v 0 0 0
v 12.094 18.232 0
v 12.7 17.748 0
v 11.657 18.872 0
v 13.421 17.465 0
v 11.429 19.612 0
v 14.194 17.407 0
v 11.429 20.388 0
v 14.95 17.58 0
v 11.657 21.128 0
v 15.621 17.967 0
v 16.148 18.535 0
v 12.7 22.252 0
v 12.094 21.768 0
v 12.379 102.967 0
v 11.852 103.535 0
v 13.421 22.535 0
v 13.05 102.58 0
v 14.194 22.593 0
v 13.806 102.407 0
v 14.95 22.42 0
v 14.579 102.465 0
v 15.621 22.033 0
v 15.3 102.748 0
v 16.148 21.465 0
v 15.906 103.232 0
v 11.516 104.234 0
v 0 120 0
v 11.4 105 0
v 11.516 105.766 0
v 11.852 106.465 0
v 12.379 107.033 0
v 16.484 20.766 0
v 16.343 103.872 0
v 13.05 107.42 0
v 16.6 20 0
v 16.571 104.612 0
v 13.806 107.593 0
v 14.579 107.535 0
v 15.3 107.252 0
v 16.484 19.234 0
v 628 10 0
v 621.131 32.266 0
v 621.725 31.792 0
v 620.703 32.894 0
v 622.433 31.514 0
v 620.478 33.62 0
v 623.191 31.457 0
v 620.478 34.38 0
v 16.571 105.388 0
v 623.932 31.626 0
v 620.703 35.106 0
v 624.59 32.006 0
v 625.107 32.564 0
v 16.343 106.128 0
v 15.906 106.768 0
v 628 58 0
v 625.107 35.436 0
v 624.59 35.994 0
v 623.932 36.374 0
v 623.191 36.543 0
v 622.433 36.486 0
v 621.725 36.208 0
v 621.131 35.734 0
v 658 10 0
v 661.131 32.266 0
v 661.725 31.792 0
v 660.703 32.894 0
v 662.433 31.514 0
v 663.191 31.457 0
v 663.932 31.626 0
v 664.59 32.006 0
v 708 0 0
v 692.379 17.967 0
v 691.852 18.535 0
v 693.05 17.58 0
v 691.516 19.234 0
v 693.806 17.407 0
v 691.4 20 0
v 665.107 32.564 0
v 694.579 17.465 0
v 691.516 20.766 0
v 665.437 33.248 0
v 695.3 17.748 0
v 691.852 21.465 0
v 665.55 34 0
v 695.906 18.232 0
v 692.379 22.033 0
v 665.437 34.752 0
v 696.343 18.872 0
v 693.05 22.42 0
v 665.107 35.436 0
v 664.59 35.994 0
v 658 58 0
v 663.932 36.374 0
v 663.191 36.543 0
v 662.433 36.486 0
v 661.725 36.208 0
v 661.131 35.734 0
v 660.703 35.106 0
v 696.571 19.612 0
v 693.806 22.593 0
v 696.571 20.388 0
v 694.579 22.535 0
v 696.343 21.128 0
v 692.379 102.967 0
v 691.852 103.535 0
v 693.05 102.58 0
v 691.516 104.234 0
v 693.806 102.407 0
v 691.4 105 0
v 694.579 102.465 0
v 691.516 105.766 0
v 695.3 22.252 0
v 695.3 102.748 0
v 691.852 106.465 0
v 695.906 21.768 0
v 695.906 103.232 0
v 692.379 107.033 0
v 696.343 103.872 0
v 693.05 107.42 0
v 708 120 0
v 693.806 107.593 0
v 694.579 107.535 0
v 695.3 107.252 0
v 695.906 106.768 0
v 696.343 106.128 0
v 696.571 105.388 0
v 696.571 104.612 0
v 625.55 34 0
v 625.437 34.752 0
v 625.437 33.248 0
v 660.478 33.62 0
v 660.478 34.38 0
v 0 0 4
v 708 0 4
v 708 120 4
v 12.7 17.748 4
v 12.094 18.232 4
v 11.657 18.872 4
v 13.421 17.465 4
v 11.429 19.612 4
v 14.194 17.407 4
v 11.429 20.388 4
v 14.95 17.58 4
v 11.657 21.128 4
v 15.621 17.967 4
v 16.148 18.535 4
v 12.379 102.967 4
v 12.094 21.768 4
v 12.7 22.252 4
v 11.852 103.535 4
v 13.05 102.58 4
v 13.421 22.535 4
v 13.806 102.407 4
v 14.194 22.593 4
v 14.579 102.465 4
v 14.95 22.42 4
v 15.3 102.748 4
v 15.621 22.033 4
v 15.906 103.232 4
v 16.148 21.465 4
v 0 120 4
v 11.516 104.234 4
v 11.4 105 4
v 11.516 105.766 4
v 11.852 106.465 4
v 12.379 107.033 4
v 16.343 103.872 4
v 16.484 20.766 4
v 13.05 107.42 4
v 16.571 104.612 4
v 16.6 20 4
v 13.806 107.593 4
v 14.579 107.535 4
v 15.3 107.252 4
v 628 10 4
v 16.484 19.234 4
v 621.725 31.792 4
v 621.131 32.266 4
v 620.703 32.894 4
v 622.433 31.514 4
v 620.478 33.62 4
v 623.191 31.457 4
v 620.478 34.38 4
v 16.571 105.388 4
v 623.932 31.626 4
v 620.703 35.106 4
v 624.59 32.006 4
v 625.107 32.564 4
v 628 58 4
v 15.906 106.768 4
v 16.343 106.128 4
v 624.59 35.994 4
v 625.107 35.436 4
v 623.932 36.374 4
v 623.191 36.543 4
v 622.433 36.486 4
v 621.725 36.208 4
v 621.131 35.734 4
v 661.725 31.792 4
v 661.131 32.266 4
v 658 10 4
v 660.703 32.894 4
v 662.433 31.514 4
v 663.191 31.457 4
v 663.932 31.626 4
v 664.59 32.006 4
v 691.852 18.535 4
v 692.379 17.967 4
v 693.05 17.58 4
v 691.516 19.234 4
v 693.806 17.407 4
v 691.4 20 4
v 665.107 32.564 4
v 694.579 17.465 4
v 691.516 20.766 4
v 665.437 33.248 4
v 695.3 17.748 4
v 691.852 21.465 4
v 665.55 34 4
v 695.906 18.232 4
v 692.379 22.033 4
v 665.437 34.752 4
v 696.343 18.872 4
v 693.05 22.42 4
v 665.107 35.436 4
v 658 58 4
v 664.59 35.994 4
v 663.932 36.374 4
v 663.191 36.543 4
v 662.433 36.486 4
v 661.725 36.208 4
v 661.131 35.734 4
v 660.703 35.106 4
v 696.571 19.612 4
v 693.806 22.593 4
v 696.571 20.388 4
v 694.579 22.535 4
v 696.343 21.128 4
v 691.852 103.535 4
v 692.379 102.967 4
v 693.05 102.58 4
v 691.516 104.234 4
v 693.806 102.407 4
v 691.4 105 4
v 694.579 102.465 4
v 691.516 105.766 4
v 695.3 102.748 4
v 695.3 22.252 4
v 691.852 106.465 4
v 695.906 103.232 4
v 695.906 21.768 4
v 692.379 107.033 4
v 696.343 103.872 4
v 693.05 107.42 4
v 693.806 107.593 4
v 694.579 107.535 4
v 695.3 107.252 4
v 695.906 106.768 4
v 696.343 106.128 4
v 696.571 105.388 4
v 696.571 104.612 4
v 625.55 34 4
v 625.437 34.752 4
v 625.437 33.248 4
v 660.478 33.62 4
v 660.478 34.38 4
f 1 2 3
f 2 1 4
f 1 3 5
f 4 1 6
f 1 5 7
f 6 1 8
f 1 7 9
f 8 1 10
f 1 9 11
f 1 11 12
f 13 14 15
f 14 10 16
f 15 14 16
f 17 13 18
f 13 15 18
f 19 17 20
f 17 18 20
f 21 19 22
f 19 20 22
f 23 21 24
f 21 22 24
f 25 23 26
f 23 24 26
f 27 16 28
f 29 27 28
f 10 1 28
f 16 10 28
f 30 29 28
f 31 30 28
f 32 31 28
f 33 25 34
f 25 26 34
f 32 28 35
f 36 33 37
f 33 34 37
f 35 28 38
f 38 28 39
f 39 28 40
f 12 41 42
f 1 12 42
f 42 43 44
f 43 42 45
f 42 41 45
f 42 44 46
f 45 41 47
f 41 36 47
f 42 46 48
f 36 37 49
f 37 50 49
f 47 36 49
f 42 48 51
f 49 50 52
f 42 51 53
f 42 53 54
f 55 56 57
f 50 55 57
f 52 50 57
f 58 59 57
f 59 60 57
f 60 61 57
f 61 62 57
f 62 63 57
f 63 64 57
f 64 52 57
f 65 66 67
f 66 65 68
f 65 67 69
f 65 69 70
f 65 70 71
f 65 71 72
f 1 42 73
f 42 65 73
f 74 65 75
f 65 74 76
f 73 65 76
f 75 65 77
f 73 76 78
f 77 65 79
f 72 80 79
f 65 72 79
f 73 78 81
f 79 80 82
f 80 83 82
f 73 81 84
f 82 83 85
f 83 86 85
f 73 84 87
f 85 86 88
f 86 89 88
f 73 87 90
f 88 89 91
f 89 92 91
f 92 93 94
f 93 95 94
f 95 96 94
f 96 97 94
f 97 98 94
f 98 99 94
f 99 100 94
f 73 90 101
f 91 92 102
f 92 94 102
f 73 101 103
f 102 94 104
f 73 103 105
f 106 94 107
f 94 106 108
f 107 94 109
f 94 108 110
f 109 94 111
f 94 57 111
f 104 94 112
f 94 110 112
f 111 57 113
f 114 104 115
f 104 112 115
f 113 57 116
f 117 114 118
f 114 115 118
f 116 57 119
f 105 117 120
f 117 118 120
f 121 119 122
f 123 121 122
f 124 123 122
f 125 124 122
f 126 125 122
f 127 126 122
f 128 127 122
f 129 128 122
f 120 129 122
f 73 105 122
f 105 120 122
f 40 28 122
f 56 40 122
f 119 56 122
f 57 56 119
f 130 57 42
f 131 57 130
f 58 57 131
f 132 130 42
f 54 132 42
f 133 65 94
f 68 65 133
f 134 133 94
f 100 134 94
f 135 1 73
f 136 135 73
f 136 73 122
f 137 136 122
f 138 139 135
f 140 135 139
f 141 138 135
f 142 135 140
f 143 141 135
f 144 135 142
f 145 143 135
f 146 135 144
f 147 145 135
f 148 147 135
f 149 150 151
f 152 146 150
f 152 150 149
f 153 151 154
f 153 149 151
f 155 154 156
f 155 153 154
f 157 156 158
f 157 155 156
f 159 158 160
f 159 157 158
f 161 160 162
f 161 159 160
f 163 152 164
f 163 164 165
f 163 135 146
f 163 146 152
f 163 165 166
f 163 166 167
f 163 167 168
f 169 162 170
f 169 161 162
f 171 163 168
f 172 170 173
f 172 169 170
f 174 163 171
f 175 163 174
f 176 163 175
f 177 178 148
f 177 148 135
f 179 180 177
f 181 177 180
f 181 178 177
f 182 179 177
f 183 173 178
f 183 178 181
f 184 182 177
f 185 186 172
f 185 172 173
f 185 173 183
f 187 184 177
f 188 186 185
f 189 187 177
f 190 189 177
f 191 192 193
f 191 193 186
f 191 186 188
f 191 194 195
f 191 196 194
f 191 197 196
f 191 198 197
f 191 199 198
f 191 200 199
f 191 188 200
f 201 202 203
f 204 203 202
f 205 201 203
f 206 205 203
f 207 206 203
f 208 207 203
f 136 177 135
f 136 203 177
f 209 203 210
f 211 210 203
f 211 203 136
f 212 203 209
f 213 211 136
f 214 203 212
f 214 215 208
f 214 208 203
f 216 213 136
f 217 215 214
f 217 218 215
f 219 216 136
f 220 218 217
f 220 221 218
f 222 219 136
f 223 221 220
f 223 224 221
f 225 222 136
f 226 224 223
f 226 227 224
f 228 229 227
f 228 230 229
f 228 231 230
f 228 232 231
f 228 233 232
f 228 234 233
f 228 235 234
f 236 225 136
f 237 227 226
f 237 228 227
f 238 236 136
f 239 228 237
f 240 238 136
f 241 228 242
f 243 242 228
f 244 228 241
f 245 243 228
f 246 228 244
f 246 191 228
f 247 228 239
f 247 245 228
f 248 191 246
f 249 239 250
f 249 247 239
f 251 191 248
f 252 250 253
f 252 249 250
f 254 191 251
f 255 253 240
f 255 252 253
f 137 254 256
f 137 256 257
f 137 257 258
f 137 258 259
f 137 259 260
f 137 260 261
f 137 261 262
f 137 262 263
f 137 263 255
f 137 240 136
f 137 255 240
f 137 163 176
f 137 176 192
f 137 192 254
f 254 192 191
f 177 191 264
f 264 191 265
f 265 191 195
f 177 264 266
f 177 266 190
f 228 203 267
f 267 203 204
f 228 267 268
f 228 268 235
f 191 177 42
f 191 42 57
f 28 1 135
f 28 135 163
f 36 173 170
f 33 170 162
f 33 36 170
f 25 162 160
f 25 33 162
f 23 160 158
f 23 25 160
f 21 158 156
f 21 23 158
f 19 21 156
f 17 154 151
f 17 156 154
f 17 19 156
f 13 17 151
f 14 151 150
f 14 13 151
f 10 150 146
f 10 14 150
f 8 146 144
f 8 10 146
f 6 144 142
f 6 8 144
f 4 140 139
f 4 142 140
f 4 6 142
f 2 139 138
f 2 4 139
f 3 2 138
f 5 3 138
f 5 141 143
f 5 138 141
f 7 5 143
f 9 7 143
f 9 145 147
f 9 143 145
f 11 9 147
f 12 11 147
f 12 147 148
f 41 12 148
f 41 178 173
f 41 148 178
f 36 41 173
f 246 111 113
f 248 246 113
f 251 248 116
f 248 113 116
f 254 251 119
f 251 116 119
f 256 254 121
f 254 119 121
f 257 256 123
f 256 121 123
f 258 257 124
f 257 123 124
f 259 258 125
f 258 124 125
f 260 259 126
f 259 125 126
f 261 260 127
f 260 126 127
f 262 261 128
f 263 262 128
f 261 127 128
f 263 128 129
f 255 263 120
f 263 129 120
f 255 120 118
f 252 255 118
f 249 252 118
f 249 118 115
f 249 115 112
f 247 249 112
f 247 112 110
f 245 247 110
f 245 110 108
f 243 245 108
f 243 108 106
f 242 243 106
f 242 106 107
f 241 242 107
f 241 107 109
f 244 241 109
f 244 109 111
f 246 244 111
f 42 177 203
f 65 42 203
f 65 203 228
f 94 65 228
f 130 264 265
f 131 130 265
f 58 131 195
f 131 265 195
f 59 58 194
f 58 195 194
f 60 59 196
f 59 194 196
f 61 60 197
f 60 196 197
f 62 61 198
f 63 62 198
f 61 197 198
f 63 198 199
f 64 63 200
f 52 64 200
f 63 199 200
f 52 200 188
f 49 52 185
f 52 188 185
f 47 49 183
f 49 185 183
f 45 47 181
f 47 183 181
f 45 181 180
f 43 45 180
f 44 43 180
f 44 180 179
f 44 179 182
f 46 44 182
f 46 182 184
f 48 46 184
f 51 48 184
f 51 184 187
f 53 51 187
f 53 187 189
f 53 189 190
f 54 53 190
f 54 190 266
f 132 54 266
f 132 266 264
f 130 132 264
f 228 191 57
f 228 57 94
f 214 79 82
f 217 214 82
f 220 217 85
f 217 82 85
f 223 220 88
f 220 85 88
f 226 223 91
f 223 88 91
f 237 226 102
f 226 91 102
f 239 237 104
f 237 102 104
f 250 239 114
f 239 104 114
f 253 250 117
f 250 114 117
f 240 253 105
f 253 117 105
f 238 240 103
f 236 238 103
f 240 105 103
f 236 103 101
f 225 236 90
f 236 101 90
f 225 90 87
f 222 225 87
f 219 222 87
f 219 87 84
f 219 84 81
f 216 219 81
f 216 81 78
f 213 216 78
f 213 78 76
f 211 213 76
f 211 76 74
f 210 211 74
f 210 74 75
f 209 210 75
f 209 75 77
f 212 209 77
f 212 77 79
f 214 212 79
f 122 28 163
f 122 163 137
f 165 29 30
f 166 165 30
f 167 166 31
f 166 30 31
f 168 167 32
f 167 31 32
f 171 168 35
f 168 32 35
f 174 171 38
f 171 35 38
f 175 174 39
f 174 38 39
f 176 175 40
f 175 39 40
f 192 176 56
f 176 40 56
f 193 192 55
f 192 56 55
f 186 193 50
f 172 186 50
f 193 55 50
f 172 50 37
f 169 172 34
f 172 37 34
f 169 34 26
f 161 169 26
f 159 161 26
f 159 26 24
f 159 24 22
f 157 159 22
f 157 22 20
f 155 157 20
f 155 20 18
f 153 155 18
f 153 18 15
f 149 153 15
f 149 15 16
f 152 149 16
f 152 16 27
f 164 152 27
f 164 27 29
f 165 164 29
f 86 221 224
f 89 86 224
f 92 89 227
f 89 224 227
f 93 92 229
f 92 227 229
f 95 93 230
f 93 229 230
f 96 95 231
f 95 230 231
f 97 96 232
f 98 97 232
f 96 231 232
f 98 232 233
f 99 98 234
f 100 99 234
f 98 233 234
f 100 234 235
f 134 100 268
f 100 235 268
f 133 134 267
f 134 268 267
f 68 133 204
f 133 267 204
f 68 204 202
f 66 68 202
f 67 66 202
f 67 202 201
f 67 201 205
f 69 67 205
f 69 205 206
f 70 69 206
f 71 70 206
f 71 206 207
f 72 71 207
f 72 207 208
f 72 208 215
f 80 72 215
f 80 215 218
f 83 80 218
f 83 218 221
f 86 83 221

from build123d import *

# Parameters (mm, degrees)
SKETCH1_W           = 708
SKETCH1_H           = 120
BOSS_EXTRUDE1_DEPTH = 4
CUT_EXTRUDE1_REACH  = 720.109
SKETCH2_R           = 2.55
SKETCH2_W           = 30
SKETCH2_H           = 48
SKETCH5_R           = 2.6
CUT_EXTRUDE3_DEPTH  = 10
SKETCH6_R           = 2.6
CUT_EXTRUDE4_DEPTH  = 10


with BuildPart() as part:
    # Sketch1 → Boss-Extrude1 (new body)
    with BuildSketch(Plane.XY):
        with Locations((354, 60)):
            Rectangle(SKETCH1_W, SKETCH1_H)
    extrude(amount=BOSS_EXTRUDE1_DEPTH)

    # Sketch2 → Cut-Extrude1 (cut, up to next)
    with BuildSketch(Plane.XY.offset(4), mode=Mode.PRIVATE) as cut_extrude1_sk1:
        with Locations((623, 34)):
            Circle(SKETCH2_R)
    cut_extrude1_tool1 = extrude(cut_extrude1_sk1.sketch, amount=-CUT_EXTRUDE1_REACH, mode=Mode.PRIVATE) & part.part
    # Sketch2 → Cut-Extrude1 (cut, up to next)
    with BuildSketch(Plane.XY.offset(4), mode=Mode.PRIVATE) as cut_extrude1_sk2:
        with Locations((663, 34)):
            Circle(SKETCH2_R)
    cut_extrude1_tool2 = extrude(cut_extrude1_sk2.sketch, amount=-CUT_EXTRUDE1_REACH, mode=Mode.PRIVATE) & part.part
    # Sketch2 → Cut-Extrude1 (cut, up to next)
    with BuildSketch(Plane.XY.offset(4), mode=Mode.PRIVATE) as cut_extrude1_sk3:
        with Locations((643, 34)):
            Rectangle(SKETCH2_W, SKETCH2_H)
    cut_extrude1_tool3 = extrude(cut_extrude1_sk3.sketch, amount=-CUT_EXTRUDE1_REACH, mode=Mode.PRIVATE) & part.part
    add(cut_extrude1_tool1.solids().sort_by_distance((623, 34, 4))[0], mode=Mode.SUBTRACT)
    add(cut_extrude1_tool2.solids().sort_by_distance((663, 34, 4))[0], mode=Mode.SUBTRACT)
    add(cut_extrude1_tool3.solids().sort_by_distance((643, 34, 4))[0], mode=Mode.SUBTRACT)

    # Sketch5 → Cut-Extrude3 (cut)
    with BuildSketch(Plane(origin=(0, 0, 0), x_dir=(-1, 0, 0), z_dir=(0, 0, -1))):
        with Locations((-694, 105)):
            Circle(SKETCH5_R)
        with Locations((-14, 105)):
            Circle(SKETCH5_R)
    extrude(amount=-CUT_EXTRUDE3_DEPTH, mode=Mode.SUBTRACT)

    # Sketch6 → Cut-Extrude4 (cut)
    with BuildSketch(Plane(origin=(0, 0, 0), x_dir=(-1, 0, 0), z_dir=(0, 0, -1))):
        with Locations((-694, 20)):
            Circle(SKETCH6_R)
    cut_extrude4 = extrude(amount=-CUT_EXTRUDE4_DEPTH, mode=Mode.SUBTRACT)

    # Mirror7: Cut-Extrude4 across plane
    add(cut_extrude4.mirror(Plane(origin=(354, 0, 0), x_dir=(0, 0, 1), z_dir=(1, 0, 0))), mode=Mode.SUBTRACT)


solid = part.part
